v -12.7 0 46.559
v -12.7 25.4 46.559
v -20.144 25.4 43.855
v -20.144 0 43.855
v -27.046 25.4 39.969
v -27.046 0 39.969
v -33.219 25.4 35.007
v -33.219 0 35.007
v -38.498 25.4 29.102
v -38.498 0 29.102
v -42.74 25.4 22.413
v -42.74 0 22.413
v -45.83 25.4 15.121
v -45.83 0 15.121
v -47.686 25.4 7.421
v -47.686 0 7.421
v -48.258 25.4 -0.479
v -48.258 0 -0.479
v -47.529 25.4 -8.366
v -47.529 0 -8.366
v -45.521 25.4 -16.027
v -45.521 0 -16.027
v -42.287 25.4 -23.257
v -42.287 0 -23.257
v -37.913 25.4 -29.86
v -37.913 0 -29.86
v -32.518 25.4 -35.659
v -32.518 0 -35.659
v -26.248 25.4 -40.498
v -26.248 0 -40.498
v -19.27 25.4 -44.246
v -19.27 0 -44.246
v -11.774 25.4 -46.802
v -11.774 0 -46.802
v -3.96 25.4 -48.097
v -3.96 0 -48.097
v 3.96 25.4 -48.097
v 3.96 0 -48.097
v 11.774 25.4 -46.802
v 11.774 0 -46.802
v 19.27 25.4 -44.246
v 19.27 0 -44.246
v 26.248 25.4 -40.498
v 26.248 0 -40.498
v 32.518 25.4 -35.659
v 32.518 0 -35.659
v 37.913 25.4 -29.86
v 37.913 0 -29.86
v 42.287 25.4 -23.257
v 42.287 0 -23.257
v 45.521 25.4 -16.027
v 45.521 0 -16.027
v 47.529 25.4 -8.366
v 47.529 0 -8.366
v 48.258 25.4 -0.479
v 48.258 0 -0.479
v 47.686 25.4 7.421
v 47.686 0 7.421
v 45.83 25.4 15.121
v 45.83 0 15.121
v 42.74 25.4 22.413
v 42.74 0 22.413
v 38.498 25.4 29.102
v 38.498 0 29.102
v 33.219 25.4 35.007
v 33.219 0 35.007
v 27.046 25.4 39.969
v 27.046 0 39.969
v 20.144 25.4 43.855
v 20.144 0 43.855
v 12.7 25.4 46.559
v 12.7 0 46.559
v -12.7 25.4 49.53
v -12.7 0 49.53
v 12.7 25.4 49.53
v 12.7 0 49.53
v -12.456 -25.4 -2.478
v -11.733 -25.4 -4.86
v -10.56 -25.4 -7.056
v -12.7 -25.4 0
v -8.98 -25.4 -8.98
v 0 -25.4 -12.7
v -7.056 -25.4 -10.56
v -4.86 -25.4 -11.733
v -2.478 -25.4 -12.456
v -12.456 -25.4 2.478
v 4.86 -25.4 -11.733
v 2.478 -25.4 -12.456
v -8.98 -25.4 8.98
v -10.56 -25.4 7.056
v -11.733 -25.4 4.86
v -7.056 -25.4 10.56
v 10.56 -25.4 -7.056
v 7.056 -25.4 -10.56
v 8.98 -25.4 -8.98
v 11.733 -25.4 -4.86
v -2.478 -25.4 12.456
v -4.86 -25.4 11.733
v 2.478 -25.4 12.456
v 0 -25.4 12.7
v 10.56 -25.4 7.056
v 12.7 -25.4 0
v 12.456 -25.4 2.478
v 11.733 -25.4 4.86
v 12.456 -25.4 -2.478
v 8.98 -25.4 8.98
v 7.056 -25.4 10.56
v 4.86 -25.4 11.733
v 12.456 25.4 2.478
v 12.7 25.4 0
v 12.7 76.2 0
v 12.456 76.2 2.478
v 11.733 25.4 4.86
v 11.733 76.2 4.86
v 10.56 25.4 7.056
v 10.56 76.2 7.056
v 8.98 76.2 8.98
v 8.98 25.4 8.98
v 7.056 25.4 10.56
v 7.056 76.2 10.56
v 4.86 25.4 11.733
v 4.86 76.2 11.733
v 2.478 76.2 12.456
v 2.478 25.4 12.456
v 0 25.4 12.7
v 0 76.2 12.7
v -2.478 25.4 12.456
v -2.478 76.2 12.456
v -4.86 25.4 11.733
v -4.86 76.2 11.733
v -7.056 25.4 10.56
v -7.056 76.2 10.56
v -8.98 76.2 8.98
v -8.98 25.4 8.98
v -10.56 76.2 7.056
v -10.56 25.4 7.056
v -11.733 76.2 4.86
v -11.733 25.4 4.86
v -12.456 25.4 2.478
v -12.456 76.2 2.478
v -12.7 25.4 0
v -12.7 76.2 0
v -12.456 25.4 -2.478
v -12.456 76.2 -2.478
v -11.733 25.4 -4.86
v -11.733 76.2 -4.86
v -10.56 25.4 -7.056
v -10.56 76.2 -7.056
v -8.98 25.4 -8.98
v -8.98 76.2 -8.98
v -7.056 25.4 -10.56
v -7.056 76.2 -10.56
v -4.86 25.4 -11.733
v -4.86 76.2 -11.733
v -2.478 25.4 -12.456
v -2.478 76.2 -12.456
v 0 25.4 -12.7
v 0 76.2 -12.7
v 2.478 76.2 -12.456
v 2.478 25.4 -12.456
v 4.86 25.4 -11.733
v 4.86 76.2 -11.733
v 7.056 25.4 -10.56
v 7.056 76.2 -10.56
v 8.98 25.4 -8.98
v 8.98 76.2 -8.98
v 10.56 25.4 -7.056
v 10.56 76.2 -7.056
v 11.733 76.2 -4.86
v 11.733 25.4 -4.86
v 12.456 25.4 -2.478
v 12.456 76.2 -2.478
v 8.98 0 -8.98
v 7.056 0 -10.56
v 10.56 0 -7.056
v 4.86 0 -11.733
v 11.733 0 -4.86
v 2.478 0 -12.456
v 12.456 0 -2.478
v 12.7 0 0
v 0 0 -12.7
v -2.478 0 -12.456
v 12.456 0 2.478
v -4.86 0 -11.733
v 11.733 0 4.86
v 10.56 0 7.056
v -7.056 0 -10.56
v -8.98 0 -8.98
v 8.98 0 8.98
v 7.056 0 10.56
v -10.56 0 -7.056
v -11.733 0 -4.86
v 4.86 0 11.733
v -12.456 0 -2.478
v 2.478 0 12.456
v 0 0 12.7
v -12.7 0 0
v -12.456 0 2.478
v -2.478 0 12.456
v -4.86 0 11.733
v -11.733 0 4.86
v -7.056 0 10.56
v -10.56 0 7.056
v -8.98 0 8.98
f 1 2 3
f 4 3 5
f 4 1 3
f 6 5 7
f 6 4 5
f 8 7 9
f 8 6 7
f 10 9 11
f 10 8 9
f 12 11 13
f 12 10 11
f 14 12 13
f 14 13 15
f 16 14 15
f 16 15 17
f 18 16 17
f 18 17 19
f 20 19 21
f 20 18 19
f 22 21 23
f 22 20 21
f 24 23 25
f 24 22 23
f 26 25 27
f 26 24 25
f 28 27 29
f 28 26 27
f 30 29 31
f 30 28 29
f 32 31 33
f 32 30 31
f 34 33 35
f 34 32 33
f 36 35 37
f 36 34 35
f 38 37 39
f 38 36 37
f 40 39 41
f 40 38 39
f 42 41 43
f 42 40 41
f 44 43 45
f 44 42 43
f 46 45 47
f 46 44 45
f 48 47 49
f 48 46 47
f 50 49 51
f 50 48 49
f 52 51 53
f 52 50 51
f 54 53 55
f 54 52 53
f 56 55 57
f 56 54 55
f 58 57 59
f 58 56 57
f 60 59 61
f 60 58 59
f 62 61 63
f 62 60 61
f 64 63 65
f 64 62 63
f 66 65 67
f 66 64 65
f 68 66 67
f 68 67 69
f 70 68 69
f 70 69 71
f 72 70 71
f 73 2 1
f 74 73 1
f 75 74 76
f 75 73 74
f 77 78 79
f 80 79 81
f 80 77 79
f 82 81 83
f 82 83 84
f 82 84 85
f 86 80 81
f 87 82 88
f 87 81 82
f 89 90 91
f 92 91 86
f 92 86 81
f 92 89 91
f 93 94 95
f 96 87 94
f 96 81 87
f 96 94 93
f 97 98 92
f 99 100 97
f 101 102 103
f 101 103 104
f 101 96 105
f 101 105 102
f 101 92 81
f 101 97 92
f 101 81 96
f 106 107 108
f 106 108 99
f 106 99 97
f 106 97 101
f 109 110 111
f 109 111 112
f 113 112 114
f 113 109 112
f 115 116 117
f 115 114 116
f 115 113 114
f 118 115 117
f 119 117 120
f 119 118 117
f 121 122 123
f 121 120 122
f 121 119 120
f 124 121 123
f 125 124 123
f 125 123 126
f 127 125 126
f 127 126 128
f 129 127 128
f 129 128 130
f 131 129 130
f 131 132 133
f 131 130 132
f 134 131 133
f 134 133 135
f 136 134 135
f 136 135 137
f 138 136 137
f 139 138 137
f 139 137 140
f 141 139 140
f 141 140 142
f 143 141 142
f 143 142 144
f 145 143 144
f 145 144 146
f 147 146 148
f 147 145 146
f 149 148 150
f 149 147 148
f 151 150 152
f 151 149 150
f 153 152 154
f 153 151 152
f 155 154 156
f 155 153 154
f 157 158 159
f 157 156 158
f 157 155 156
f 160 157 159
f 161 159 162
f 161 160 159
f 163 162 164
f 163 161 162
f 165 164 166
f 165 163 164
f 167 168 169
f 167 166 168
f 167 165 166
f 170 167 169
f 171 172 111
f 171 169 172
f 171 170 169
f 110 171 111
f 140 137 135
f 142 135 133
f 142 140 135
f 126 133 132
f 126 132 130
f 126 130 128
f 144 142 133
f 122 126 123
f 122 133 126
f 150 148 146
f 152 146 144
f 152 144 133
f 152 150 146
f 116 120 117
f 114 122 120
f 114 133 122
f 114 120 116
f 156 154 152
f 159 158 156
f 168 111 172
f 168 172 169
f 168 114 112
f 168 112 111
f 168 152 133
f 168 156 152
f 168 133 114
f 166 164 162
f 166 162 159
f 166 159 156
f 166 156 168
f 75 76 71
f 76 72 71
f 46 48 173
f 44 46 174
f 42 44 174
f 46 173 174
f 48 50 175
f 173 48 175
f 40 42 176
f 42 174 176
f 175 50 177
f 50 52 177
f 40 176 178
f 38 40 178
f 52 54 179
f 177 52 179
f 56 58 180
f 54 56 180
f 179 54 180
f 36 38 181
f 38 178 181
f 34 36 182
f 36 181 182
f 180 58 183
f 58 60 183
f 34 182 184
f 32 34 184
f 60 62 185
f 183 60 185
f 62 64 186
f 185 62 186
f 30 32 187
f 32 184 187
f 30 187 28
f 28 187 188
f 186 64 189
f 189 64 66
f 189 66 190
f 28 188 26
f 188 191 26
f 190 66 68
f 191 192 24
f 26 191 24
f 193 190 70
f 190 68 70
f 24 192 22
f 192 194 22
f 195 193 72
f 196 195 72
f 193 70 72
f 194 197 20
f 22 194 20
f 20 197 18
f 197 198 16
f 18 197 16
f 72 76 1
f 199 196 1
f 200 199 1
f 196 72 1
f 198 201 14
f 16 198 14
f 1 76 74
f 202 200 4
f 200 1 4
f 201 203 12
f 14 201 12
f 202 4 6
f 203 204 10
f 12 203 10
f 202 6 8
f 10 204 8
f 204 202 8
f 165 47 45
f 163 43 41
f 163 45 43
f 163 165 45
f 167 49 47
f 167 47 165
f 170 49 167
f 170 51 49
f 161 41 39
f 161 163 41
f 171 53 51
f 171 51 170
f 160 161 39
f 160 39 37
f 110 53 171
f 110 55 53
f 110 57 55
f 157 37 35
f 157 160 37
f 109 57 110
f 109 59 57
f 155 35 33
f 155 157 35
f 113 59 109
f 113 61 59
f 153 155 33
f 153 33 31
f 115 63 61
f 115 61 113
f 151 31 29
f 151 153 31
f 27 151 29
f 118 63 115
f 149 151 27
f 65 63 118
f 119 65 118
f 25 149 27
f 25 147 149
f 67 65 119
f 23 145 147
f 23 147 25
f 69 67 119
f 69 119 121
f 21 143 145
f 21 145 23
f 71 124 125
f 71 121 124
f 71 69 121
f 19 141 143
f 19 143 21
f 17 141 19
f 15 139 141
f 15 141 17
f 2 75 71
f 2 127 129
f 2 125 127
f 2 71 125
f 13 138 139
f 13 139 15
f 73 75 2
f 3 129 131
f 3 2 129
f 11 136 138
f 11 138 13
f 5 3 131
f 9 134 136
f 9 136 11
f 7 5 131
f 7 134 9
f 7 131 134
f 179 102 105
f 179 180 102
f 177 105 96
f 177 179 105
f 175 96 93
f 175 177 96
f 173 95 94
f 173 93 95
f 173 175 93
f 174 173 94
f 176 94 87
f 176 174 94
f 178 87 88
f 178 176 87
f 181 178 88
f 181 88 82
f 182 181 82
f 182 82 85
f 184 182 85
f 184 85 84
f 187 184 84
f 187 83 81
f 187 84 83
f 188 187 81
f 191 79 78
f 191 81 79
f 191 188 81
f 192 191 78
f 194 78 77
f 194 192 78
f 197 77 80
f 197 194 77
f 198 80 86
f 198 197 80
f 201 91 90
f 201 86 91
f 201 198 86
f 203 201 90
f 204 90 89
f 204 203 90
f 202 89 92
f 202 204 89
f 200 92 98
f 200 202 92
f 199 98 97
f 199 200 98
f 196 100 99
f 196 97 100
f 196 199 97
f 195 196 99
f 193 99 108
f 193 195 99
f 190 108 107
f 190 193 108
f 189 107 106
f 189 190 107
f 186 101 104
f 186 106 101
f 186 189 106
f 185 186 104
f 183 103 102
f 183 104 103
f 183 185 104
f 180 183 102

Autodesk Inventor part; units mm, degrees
ref_plane "YZ Plane" through (0, 0, 0) normal (1, 0, 0) x (0, 1, 0)
ref_plane "XZ Plane" through (0, 0, 0) normal (0, 1, 0) x (-1, 0, 0)
sketch "Sketch1" plane through (0, 0, 0) normal (0, 1, 0) x (-1, 0, 0)
  circle A0 centre (0, 0) radius 48.26
  dimension "d0" = 96.52
extrude "Extrusion1" add sketch "Sketch1" along normal blind 25.4
sketch "Sketch2" plane through (0, 25.4, 0) normal (0, 1, 0) x (1, 0, 0)
  circle A0 centre (0, 0) radius 12.7
  dimension "d3" = 25.4
extrude "Extrusion2" add sketch "Sketch2" along normal blind 50.8
sketch "Sketch3" plane through (0, 0, 0) normal (0, -1, 0) x (1, 0, 0)
  circle A0 centre (0, 0) radius 12.7 projected
  circle A1 centre (0, 0) radius 12.7
extrude "Extrusion3" add sketch "Sketch3" along normal blind 25.4
ref_plane "Work Plane1" through (0, 0, 48.26) normal (0, 0, 1) x (1, 0, 0)
sketch "Sketch4" plane through (0, 0, 48.26) normal (0, 0, 1) x (1, 0, 0)
  line L0 (0, 0) -> (0, 25.4)
  line L1 (0, 0) -> (12.7, 0)
  line L2 (0, 0) -> (-12.7, 0)
  line L3 (12.7, 0) -> (12.7, 25.4)
  line L4 (12.7, 25.4) -> (-12.7, 25.4)
  line L5 (-12.7, 25.4) -> (-12.7, 0)
  line L6 (-48.26, 0) -> (48.26, 0) projected
  dimension "d9" = 12.7
  dimension "d10" = 25.4
  dimension "d11" = 12.7
extrude "Extrusion4" add sketch "Sketch4" along normal blind 1.27 and the other way blind 12.7
properties part number "T100 rough draft"
